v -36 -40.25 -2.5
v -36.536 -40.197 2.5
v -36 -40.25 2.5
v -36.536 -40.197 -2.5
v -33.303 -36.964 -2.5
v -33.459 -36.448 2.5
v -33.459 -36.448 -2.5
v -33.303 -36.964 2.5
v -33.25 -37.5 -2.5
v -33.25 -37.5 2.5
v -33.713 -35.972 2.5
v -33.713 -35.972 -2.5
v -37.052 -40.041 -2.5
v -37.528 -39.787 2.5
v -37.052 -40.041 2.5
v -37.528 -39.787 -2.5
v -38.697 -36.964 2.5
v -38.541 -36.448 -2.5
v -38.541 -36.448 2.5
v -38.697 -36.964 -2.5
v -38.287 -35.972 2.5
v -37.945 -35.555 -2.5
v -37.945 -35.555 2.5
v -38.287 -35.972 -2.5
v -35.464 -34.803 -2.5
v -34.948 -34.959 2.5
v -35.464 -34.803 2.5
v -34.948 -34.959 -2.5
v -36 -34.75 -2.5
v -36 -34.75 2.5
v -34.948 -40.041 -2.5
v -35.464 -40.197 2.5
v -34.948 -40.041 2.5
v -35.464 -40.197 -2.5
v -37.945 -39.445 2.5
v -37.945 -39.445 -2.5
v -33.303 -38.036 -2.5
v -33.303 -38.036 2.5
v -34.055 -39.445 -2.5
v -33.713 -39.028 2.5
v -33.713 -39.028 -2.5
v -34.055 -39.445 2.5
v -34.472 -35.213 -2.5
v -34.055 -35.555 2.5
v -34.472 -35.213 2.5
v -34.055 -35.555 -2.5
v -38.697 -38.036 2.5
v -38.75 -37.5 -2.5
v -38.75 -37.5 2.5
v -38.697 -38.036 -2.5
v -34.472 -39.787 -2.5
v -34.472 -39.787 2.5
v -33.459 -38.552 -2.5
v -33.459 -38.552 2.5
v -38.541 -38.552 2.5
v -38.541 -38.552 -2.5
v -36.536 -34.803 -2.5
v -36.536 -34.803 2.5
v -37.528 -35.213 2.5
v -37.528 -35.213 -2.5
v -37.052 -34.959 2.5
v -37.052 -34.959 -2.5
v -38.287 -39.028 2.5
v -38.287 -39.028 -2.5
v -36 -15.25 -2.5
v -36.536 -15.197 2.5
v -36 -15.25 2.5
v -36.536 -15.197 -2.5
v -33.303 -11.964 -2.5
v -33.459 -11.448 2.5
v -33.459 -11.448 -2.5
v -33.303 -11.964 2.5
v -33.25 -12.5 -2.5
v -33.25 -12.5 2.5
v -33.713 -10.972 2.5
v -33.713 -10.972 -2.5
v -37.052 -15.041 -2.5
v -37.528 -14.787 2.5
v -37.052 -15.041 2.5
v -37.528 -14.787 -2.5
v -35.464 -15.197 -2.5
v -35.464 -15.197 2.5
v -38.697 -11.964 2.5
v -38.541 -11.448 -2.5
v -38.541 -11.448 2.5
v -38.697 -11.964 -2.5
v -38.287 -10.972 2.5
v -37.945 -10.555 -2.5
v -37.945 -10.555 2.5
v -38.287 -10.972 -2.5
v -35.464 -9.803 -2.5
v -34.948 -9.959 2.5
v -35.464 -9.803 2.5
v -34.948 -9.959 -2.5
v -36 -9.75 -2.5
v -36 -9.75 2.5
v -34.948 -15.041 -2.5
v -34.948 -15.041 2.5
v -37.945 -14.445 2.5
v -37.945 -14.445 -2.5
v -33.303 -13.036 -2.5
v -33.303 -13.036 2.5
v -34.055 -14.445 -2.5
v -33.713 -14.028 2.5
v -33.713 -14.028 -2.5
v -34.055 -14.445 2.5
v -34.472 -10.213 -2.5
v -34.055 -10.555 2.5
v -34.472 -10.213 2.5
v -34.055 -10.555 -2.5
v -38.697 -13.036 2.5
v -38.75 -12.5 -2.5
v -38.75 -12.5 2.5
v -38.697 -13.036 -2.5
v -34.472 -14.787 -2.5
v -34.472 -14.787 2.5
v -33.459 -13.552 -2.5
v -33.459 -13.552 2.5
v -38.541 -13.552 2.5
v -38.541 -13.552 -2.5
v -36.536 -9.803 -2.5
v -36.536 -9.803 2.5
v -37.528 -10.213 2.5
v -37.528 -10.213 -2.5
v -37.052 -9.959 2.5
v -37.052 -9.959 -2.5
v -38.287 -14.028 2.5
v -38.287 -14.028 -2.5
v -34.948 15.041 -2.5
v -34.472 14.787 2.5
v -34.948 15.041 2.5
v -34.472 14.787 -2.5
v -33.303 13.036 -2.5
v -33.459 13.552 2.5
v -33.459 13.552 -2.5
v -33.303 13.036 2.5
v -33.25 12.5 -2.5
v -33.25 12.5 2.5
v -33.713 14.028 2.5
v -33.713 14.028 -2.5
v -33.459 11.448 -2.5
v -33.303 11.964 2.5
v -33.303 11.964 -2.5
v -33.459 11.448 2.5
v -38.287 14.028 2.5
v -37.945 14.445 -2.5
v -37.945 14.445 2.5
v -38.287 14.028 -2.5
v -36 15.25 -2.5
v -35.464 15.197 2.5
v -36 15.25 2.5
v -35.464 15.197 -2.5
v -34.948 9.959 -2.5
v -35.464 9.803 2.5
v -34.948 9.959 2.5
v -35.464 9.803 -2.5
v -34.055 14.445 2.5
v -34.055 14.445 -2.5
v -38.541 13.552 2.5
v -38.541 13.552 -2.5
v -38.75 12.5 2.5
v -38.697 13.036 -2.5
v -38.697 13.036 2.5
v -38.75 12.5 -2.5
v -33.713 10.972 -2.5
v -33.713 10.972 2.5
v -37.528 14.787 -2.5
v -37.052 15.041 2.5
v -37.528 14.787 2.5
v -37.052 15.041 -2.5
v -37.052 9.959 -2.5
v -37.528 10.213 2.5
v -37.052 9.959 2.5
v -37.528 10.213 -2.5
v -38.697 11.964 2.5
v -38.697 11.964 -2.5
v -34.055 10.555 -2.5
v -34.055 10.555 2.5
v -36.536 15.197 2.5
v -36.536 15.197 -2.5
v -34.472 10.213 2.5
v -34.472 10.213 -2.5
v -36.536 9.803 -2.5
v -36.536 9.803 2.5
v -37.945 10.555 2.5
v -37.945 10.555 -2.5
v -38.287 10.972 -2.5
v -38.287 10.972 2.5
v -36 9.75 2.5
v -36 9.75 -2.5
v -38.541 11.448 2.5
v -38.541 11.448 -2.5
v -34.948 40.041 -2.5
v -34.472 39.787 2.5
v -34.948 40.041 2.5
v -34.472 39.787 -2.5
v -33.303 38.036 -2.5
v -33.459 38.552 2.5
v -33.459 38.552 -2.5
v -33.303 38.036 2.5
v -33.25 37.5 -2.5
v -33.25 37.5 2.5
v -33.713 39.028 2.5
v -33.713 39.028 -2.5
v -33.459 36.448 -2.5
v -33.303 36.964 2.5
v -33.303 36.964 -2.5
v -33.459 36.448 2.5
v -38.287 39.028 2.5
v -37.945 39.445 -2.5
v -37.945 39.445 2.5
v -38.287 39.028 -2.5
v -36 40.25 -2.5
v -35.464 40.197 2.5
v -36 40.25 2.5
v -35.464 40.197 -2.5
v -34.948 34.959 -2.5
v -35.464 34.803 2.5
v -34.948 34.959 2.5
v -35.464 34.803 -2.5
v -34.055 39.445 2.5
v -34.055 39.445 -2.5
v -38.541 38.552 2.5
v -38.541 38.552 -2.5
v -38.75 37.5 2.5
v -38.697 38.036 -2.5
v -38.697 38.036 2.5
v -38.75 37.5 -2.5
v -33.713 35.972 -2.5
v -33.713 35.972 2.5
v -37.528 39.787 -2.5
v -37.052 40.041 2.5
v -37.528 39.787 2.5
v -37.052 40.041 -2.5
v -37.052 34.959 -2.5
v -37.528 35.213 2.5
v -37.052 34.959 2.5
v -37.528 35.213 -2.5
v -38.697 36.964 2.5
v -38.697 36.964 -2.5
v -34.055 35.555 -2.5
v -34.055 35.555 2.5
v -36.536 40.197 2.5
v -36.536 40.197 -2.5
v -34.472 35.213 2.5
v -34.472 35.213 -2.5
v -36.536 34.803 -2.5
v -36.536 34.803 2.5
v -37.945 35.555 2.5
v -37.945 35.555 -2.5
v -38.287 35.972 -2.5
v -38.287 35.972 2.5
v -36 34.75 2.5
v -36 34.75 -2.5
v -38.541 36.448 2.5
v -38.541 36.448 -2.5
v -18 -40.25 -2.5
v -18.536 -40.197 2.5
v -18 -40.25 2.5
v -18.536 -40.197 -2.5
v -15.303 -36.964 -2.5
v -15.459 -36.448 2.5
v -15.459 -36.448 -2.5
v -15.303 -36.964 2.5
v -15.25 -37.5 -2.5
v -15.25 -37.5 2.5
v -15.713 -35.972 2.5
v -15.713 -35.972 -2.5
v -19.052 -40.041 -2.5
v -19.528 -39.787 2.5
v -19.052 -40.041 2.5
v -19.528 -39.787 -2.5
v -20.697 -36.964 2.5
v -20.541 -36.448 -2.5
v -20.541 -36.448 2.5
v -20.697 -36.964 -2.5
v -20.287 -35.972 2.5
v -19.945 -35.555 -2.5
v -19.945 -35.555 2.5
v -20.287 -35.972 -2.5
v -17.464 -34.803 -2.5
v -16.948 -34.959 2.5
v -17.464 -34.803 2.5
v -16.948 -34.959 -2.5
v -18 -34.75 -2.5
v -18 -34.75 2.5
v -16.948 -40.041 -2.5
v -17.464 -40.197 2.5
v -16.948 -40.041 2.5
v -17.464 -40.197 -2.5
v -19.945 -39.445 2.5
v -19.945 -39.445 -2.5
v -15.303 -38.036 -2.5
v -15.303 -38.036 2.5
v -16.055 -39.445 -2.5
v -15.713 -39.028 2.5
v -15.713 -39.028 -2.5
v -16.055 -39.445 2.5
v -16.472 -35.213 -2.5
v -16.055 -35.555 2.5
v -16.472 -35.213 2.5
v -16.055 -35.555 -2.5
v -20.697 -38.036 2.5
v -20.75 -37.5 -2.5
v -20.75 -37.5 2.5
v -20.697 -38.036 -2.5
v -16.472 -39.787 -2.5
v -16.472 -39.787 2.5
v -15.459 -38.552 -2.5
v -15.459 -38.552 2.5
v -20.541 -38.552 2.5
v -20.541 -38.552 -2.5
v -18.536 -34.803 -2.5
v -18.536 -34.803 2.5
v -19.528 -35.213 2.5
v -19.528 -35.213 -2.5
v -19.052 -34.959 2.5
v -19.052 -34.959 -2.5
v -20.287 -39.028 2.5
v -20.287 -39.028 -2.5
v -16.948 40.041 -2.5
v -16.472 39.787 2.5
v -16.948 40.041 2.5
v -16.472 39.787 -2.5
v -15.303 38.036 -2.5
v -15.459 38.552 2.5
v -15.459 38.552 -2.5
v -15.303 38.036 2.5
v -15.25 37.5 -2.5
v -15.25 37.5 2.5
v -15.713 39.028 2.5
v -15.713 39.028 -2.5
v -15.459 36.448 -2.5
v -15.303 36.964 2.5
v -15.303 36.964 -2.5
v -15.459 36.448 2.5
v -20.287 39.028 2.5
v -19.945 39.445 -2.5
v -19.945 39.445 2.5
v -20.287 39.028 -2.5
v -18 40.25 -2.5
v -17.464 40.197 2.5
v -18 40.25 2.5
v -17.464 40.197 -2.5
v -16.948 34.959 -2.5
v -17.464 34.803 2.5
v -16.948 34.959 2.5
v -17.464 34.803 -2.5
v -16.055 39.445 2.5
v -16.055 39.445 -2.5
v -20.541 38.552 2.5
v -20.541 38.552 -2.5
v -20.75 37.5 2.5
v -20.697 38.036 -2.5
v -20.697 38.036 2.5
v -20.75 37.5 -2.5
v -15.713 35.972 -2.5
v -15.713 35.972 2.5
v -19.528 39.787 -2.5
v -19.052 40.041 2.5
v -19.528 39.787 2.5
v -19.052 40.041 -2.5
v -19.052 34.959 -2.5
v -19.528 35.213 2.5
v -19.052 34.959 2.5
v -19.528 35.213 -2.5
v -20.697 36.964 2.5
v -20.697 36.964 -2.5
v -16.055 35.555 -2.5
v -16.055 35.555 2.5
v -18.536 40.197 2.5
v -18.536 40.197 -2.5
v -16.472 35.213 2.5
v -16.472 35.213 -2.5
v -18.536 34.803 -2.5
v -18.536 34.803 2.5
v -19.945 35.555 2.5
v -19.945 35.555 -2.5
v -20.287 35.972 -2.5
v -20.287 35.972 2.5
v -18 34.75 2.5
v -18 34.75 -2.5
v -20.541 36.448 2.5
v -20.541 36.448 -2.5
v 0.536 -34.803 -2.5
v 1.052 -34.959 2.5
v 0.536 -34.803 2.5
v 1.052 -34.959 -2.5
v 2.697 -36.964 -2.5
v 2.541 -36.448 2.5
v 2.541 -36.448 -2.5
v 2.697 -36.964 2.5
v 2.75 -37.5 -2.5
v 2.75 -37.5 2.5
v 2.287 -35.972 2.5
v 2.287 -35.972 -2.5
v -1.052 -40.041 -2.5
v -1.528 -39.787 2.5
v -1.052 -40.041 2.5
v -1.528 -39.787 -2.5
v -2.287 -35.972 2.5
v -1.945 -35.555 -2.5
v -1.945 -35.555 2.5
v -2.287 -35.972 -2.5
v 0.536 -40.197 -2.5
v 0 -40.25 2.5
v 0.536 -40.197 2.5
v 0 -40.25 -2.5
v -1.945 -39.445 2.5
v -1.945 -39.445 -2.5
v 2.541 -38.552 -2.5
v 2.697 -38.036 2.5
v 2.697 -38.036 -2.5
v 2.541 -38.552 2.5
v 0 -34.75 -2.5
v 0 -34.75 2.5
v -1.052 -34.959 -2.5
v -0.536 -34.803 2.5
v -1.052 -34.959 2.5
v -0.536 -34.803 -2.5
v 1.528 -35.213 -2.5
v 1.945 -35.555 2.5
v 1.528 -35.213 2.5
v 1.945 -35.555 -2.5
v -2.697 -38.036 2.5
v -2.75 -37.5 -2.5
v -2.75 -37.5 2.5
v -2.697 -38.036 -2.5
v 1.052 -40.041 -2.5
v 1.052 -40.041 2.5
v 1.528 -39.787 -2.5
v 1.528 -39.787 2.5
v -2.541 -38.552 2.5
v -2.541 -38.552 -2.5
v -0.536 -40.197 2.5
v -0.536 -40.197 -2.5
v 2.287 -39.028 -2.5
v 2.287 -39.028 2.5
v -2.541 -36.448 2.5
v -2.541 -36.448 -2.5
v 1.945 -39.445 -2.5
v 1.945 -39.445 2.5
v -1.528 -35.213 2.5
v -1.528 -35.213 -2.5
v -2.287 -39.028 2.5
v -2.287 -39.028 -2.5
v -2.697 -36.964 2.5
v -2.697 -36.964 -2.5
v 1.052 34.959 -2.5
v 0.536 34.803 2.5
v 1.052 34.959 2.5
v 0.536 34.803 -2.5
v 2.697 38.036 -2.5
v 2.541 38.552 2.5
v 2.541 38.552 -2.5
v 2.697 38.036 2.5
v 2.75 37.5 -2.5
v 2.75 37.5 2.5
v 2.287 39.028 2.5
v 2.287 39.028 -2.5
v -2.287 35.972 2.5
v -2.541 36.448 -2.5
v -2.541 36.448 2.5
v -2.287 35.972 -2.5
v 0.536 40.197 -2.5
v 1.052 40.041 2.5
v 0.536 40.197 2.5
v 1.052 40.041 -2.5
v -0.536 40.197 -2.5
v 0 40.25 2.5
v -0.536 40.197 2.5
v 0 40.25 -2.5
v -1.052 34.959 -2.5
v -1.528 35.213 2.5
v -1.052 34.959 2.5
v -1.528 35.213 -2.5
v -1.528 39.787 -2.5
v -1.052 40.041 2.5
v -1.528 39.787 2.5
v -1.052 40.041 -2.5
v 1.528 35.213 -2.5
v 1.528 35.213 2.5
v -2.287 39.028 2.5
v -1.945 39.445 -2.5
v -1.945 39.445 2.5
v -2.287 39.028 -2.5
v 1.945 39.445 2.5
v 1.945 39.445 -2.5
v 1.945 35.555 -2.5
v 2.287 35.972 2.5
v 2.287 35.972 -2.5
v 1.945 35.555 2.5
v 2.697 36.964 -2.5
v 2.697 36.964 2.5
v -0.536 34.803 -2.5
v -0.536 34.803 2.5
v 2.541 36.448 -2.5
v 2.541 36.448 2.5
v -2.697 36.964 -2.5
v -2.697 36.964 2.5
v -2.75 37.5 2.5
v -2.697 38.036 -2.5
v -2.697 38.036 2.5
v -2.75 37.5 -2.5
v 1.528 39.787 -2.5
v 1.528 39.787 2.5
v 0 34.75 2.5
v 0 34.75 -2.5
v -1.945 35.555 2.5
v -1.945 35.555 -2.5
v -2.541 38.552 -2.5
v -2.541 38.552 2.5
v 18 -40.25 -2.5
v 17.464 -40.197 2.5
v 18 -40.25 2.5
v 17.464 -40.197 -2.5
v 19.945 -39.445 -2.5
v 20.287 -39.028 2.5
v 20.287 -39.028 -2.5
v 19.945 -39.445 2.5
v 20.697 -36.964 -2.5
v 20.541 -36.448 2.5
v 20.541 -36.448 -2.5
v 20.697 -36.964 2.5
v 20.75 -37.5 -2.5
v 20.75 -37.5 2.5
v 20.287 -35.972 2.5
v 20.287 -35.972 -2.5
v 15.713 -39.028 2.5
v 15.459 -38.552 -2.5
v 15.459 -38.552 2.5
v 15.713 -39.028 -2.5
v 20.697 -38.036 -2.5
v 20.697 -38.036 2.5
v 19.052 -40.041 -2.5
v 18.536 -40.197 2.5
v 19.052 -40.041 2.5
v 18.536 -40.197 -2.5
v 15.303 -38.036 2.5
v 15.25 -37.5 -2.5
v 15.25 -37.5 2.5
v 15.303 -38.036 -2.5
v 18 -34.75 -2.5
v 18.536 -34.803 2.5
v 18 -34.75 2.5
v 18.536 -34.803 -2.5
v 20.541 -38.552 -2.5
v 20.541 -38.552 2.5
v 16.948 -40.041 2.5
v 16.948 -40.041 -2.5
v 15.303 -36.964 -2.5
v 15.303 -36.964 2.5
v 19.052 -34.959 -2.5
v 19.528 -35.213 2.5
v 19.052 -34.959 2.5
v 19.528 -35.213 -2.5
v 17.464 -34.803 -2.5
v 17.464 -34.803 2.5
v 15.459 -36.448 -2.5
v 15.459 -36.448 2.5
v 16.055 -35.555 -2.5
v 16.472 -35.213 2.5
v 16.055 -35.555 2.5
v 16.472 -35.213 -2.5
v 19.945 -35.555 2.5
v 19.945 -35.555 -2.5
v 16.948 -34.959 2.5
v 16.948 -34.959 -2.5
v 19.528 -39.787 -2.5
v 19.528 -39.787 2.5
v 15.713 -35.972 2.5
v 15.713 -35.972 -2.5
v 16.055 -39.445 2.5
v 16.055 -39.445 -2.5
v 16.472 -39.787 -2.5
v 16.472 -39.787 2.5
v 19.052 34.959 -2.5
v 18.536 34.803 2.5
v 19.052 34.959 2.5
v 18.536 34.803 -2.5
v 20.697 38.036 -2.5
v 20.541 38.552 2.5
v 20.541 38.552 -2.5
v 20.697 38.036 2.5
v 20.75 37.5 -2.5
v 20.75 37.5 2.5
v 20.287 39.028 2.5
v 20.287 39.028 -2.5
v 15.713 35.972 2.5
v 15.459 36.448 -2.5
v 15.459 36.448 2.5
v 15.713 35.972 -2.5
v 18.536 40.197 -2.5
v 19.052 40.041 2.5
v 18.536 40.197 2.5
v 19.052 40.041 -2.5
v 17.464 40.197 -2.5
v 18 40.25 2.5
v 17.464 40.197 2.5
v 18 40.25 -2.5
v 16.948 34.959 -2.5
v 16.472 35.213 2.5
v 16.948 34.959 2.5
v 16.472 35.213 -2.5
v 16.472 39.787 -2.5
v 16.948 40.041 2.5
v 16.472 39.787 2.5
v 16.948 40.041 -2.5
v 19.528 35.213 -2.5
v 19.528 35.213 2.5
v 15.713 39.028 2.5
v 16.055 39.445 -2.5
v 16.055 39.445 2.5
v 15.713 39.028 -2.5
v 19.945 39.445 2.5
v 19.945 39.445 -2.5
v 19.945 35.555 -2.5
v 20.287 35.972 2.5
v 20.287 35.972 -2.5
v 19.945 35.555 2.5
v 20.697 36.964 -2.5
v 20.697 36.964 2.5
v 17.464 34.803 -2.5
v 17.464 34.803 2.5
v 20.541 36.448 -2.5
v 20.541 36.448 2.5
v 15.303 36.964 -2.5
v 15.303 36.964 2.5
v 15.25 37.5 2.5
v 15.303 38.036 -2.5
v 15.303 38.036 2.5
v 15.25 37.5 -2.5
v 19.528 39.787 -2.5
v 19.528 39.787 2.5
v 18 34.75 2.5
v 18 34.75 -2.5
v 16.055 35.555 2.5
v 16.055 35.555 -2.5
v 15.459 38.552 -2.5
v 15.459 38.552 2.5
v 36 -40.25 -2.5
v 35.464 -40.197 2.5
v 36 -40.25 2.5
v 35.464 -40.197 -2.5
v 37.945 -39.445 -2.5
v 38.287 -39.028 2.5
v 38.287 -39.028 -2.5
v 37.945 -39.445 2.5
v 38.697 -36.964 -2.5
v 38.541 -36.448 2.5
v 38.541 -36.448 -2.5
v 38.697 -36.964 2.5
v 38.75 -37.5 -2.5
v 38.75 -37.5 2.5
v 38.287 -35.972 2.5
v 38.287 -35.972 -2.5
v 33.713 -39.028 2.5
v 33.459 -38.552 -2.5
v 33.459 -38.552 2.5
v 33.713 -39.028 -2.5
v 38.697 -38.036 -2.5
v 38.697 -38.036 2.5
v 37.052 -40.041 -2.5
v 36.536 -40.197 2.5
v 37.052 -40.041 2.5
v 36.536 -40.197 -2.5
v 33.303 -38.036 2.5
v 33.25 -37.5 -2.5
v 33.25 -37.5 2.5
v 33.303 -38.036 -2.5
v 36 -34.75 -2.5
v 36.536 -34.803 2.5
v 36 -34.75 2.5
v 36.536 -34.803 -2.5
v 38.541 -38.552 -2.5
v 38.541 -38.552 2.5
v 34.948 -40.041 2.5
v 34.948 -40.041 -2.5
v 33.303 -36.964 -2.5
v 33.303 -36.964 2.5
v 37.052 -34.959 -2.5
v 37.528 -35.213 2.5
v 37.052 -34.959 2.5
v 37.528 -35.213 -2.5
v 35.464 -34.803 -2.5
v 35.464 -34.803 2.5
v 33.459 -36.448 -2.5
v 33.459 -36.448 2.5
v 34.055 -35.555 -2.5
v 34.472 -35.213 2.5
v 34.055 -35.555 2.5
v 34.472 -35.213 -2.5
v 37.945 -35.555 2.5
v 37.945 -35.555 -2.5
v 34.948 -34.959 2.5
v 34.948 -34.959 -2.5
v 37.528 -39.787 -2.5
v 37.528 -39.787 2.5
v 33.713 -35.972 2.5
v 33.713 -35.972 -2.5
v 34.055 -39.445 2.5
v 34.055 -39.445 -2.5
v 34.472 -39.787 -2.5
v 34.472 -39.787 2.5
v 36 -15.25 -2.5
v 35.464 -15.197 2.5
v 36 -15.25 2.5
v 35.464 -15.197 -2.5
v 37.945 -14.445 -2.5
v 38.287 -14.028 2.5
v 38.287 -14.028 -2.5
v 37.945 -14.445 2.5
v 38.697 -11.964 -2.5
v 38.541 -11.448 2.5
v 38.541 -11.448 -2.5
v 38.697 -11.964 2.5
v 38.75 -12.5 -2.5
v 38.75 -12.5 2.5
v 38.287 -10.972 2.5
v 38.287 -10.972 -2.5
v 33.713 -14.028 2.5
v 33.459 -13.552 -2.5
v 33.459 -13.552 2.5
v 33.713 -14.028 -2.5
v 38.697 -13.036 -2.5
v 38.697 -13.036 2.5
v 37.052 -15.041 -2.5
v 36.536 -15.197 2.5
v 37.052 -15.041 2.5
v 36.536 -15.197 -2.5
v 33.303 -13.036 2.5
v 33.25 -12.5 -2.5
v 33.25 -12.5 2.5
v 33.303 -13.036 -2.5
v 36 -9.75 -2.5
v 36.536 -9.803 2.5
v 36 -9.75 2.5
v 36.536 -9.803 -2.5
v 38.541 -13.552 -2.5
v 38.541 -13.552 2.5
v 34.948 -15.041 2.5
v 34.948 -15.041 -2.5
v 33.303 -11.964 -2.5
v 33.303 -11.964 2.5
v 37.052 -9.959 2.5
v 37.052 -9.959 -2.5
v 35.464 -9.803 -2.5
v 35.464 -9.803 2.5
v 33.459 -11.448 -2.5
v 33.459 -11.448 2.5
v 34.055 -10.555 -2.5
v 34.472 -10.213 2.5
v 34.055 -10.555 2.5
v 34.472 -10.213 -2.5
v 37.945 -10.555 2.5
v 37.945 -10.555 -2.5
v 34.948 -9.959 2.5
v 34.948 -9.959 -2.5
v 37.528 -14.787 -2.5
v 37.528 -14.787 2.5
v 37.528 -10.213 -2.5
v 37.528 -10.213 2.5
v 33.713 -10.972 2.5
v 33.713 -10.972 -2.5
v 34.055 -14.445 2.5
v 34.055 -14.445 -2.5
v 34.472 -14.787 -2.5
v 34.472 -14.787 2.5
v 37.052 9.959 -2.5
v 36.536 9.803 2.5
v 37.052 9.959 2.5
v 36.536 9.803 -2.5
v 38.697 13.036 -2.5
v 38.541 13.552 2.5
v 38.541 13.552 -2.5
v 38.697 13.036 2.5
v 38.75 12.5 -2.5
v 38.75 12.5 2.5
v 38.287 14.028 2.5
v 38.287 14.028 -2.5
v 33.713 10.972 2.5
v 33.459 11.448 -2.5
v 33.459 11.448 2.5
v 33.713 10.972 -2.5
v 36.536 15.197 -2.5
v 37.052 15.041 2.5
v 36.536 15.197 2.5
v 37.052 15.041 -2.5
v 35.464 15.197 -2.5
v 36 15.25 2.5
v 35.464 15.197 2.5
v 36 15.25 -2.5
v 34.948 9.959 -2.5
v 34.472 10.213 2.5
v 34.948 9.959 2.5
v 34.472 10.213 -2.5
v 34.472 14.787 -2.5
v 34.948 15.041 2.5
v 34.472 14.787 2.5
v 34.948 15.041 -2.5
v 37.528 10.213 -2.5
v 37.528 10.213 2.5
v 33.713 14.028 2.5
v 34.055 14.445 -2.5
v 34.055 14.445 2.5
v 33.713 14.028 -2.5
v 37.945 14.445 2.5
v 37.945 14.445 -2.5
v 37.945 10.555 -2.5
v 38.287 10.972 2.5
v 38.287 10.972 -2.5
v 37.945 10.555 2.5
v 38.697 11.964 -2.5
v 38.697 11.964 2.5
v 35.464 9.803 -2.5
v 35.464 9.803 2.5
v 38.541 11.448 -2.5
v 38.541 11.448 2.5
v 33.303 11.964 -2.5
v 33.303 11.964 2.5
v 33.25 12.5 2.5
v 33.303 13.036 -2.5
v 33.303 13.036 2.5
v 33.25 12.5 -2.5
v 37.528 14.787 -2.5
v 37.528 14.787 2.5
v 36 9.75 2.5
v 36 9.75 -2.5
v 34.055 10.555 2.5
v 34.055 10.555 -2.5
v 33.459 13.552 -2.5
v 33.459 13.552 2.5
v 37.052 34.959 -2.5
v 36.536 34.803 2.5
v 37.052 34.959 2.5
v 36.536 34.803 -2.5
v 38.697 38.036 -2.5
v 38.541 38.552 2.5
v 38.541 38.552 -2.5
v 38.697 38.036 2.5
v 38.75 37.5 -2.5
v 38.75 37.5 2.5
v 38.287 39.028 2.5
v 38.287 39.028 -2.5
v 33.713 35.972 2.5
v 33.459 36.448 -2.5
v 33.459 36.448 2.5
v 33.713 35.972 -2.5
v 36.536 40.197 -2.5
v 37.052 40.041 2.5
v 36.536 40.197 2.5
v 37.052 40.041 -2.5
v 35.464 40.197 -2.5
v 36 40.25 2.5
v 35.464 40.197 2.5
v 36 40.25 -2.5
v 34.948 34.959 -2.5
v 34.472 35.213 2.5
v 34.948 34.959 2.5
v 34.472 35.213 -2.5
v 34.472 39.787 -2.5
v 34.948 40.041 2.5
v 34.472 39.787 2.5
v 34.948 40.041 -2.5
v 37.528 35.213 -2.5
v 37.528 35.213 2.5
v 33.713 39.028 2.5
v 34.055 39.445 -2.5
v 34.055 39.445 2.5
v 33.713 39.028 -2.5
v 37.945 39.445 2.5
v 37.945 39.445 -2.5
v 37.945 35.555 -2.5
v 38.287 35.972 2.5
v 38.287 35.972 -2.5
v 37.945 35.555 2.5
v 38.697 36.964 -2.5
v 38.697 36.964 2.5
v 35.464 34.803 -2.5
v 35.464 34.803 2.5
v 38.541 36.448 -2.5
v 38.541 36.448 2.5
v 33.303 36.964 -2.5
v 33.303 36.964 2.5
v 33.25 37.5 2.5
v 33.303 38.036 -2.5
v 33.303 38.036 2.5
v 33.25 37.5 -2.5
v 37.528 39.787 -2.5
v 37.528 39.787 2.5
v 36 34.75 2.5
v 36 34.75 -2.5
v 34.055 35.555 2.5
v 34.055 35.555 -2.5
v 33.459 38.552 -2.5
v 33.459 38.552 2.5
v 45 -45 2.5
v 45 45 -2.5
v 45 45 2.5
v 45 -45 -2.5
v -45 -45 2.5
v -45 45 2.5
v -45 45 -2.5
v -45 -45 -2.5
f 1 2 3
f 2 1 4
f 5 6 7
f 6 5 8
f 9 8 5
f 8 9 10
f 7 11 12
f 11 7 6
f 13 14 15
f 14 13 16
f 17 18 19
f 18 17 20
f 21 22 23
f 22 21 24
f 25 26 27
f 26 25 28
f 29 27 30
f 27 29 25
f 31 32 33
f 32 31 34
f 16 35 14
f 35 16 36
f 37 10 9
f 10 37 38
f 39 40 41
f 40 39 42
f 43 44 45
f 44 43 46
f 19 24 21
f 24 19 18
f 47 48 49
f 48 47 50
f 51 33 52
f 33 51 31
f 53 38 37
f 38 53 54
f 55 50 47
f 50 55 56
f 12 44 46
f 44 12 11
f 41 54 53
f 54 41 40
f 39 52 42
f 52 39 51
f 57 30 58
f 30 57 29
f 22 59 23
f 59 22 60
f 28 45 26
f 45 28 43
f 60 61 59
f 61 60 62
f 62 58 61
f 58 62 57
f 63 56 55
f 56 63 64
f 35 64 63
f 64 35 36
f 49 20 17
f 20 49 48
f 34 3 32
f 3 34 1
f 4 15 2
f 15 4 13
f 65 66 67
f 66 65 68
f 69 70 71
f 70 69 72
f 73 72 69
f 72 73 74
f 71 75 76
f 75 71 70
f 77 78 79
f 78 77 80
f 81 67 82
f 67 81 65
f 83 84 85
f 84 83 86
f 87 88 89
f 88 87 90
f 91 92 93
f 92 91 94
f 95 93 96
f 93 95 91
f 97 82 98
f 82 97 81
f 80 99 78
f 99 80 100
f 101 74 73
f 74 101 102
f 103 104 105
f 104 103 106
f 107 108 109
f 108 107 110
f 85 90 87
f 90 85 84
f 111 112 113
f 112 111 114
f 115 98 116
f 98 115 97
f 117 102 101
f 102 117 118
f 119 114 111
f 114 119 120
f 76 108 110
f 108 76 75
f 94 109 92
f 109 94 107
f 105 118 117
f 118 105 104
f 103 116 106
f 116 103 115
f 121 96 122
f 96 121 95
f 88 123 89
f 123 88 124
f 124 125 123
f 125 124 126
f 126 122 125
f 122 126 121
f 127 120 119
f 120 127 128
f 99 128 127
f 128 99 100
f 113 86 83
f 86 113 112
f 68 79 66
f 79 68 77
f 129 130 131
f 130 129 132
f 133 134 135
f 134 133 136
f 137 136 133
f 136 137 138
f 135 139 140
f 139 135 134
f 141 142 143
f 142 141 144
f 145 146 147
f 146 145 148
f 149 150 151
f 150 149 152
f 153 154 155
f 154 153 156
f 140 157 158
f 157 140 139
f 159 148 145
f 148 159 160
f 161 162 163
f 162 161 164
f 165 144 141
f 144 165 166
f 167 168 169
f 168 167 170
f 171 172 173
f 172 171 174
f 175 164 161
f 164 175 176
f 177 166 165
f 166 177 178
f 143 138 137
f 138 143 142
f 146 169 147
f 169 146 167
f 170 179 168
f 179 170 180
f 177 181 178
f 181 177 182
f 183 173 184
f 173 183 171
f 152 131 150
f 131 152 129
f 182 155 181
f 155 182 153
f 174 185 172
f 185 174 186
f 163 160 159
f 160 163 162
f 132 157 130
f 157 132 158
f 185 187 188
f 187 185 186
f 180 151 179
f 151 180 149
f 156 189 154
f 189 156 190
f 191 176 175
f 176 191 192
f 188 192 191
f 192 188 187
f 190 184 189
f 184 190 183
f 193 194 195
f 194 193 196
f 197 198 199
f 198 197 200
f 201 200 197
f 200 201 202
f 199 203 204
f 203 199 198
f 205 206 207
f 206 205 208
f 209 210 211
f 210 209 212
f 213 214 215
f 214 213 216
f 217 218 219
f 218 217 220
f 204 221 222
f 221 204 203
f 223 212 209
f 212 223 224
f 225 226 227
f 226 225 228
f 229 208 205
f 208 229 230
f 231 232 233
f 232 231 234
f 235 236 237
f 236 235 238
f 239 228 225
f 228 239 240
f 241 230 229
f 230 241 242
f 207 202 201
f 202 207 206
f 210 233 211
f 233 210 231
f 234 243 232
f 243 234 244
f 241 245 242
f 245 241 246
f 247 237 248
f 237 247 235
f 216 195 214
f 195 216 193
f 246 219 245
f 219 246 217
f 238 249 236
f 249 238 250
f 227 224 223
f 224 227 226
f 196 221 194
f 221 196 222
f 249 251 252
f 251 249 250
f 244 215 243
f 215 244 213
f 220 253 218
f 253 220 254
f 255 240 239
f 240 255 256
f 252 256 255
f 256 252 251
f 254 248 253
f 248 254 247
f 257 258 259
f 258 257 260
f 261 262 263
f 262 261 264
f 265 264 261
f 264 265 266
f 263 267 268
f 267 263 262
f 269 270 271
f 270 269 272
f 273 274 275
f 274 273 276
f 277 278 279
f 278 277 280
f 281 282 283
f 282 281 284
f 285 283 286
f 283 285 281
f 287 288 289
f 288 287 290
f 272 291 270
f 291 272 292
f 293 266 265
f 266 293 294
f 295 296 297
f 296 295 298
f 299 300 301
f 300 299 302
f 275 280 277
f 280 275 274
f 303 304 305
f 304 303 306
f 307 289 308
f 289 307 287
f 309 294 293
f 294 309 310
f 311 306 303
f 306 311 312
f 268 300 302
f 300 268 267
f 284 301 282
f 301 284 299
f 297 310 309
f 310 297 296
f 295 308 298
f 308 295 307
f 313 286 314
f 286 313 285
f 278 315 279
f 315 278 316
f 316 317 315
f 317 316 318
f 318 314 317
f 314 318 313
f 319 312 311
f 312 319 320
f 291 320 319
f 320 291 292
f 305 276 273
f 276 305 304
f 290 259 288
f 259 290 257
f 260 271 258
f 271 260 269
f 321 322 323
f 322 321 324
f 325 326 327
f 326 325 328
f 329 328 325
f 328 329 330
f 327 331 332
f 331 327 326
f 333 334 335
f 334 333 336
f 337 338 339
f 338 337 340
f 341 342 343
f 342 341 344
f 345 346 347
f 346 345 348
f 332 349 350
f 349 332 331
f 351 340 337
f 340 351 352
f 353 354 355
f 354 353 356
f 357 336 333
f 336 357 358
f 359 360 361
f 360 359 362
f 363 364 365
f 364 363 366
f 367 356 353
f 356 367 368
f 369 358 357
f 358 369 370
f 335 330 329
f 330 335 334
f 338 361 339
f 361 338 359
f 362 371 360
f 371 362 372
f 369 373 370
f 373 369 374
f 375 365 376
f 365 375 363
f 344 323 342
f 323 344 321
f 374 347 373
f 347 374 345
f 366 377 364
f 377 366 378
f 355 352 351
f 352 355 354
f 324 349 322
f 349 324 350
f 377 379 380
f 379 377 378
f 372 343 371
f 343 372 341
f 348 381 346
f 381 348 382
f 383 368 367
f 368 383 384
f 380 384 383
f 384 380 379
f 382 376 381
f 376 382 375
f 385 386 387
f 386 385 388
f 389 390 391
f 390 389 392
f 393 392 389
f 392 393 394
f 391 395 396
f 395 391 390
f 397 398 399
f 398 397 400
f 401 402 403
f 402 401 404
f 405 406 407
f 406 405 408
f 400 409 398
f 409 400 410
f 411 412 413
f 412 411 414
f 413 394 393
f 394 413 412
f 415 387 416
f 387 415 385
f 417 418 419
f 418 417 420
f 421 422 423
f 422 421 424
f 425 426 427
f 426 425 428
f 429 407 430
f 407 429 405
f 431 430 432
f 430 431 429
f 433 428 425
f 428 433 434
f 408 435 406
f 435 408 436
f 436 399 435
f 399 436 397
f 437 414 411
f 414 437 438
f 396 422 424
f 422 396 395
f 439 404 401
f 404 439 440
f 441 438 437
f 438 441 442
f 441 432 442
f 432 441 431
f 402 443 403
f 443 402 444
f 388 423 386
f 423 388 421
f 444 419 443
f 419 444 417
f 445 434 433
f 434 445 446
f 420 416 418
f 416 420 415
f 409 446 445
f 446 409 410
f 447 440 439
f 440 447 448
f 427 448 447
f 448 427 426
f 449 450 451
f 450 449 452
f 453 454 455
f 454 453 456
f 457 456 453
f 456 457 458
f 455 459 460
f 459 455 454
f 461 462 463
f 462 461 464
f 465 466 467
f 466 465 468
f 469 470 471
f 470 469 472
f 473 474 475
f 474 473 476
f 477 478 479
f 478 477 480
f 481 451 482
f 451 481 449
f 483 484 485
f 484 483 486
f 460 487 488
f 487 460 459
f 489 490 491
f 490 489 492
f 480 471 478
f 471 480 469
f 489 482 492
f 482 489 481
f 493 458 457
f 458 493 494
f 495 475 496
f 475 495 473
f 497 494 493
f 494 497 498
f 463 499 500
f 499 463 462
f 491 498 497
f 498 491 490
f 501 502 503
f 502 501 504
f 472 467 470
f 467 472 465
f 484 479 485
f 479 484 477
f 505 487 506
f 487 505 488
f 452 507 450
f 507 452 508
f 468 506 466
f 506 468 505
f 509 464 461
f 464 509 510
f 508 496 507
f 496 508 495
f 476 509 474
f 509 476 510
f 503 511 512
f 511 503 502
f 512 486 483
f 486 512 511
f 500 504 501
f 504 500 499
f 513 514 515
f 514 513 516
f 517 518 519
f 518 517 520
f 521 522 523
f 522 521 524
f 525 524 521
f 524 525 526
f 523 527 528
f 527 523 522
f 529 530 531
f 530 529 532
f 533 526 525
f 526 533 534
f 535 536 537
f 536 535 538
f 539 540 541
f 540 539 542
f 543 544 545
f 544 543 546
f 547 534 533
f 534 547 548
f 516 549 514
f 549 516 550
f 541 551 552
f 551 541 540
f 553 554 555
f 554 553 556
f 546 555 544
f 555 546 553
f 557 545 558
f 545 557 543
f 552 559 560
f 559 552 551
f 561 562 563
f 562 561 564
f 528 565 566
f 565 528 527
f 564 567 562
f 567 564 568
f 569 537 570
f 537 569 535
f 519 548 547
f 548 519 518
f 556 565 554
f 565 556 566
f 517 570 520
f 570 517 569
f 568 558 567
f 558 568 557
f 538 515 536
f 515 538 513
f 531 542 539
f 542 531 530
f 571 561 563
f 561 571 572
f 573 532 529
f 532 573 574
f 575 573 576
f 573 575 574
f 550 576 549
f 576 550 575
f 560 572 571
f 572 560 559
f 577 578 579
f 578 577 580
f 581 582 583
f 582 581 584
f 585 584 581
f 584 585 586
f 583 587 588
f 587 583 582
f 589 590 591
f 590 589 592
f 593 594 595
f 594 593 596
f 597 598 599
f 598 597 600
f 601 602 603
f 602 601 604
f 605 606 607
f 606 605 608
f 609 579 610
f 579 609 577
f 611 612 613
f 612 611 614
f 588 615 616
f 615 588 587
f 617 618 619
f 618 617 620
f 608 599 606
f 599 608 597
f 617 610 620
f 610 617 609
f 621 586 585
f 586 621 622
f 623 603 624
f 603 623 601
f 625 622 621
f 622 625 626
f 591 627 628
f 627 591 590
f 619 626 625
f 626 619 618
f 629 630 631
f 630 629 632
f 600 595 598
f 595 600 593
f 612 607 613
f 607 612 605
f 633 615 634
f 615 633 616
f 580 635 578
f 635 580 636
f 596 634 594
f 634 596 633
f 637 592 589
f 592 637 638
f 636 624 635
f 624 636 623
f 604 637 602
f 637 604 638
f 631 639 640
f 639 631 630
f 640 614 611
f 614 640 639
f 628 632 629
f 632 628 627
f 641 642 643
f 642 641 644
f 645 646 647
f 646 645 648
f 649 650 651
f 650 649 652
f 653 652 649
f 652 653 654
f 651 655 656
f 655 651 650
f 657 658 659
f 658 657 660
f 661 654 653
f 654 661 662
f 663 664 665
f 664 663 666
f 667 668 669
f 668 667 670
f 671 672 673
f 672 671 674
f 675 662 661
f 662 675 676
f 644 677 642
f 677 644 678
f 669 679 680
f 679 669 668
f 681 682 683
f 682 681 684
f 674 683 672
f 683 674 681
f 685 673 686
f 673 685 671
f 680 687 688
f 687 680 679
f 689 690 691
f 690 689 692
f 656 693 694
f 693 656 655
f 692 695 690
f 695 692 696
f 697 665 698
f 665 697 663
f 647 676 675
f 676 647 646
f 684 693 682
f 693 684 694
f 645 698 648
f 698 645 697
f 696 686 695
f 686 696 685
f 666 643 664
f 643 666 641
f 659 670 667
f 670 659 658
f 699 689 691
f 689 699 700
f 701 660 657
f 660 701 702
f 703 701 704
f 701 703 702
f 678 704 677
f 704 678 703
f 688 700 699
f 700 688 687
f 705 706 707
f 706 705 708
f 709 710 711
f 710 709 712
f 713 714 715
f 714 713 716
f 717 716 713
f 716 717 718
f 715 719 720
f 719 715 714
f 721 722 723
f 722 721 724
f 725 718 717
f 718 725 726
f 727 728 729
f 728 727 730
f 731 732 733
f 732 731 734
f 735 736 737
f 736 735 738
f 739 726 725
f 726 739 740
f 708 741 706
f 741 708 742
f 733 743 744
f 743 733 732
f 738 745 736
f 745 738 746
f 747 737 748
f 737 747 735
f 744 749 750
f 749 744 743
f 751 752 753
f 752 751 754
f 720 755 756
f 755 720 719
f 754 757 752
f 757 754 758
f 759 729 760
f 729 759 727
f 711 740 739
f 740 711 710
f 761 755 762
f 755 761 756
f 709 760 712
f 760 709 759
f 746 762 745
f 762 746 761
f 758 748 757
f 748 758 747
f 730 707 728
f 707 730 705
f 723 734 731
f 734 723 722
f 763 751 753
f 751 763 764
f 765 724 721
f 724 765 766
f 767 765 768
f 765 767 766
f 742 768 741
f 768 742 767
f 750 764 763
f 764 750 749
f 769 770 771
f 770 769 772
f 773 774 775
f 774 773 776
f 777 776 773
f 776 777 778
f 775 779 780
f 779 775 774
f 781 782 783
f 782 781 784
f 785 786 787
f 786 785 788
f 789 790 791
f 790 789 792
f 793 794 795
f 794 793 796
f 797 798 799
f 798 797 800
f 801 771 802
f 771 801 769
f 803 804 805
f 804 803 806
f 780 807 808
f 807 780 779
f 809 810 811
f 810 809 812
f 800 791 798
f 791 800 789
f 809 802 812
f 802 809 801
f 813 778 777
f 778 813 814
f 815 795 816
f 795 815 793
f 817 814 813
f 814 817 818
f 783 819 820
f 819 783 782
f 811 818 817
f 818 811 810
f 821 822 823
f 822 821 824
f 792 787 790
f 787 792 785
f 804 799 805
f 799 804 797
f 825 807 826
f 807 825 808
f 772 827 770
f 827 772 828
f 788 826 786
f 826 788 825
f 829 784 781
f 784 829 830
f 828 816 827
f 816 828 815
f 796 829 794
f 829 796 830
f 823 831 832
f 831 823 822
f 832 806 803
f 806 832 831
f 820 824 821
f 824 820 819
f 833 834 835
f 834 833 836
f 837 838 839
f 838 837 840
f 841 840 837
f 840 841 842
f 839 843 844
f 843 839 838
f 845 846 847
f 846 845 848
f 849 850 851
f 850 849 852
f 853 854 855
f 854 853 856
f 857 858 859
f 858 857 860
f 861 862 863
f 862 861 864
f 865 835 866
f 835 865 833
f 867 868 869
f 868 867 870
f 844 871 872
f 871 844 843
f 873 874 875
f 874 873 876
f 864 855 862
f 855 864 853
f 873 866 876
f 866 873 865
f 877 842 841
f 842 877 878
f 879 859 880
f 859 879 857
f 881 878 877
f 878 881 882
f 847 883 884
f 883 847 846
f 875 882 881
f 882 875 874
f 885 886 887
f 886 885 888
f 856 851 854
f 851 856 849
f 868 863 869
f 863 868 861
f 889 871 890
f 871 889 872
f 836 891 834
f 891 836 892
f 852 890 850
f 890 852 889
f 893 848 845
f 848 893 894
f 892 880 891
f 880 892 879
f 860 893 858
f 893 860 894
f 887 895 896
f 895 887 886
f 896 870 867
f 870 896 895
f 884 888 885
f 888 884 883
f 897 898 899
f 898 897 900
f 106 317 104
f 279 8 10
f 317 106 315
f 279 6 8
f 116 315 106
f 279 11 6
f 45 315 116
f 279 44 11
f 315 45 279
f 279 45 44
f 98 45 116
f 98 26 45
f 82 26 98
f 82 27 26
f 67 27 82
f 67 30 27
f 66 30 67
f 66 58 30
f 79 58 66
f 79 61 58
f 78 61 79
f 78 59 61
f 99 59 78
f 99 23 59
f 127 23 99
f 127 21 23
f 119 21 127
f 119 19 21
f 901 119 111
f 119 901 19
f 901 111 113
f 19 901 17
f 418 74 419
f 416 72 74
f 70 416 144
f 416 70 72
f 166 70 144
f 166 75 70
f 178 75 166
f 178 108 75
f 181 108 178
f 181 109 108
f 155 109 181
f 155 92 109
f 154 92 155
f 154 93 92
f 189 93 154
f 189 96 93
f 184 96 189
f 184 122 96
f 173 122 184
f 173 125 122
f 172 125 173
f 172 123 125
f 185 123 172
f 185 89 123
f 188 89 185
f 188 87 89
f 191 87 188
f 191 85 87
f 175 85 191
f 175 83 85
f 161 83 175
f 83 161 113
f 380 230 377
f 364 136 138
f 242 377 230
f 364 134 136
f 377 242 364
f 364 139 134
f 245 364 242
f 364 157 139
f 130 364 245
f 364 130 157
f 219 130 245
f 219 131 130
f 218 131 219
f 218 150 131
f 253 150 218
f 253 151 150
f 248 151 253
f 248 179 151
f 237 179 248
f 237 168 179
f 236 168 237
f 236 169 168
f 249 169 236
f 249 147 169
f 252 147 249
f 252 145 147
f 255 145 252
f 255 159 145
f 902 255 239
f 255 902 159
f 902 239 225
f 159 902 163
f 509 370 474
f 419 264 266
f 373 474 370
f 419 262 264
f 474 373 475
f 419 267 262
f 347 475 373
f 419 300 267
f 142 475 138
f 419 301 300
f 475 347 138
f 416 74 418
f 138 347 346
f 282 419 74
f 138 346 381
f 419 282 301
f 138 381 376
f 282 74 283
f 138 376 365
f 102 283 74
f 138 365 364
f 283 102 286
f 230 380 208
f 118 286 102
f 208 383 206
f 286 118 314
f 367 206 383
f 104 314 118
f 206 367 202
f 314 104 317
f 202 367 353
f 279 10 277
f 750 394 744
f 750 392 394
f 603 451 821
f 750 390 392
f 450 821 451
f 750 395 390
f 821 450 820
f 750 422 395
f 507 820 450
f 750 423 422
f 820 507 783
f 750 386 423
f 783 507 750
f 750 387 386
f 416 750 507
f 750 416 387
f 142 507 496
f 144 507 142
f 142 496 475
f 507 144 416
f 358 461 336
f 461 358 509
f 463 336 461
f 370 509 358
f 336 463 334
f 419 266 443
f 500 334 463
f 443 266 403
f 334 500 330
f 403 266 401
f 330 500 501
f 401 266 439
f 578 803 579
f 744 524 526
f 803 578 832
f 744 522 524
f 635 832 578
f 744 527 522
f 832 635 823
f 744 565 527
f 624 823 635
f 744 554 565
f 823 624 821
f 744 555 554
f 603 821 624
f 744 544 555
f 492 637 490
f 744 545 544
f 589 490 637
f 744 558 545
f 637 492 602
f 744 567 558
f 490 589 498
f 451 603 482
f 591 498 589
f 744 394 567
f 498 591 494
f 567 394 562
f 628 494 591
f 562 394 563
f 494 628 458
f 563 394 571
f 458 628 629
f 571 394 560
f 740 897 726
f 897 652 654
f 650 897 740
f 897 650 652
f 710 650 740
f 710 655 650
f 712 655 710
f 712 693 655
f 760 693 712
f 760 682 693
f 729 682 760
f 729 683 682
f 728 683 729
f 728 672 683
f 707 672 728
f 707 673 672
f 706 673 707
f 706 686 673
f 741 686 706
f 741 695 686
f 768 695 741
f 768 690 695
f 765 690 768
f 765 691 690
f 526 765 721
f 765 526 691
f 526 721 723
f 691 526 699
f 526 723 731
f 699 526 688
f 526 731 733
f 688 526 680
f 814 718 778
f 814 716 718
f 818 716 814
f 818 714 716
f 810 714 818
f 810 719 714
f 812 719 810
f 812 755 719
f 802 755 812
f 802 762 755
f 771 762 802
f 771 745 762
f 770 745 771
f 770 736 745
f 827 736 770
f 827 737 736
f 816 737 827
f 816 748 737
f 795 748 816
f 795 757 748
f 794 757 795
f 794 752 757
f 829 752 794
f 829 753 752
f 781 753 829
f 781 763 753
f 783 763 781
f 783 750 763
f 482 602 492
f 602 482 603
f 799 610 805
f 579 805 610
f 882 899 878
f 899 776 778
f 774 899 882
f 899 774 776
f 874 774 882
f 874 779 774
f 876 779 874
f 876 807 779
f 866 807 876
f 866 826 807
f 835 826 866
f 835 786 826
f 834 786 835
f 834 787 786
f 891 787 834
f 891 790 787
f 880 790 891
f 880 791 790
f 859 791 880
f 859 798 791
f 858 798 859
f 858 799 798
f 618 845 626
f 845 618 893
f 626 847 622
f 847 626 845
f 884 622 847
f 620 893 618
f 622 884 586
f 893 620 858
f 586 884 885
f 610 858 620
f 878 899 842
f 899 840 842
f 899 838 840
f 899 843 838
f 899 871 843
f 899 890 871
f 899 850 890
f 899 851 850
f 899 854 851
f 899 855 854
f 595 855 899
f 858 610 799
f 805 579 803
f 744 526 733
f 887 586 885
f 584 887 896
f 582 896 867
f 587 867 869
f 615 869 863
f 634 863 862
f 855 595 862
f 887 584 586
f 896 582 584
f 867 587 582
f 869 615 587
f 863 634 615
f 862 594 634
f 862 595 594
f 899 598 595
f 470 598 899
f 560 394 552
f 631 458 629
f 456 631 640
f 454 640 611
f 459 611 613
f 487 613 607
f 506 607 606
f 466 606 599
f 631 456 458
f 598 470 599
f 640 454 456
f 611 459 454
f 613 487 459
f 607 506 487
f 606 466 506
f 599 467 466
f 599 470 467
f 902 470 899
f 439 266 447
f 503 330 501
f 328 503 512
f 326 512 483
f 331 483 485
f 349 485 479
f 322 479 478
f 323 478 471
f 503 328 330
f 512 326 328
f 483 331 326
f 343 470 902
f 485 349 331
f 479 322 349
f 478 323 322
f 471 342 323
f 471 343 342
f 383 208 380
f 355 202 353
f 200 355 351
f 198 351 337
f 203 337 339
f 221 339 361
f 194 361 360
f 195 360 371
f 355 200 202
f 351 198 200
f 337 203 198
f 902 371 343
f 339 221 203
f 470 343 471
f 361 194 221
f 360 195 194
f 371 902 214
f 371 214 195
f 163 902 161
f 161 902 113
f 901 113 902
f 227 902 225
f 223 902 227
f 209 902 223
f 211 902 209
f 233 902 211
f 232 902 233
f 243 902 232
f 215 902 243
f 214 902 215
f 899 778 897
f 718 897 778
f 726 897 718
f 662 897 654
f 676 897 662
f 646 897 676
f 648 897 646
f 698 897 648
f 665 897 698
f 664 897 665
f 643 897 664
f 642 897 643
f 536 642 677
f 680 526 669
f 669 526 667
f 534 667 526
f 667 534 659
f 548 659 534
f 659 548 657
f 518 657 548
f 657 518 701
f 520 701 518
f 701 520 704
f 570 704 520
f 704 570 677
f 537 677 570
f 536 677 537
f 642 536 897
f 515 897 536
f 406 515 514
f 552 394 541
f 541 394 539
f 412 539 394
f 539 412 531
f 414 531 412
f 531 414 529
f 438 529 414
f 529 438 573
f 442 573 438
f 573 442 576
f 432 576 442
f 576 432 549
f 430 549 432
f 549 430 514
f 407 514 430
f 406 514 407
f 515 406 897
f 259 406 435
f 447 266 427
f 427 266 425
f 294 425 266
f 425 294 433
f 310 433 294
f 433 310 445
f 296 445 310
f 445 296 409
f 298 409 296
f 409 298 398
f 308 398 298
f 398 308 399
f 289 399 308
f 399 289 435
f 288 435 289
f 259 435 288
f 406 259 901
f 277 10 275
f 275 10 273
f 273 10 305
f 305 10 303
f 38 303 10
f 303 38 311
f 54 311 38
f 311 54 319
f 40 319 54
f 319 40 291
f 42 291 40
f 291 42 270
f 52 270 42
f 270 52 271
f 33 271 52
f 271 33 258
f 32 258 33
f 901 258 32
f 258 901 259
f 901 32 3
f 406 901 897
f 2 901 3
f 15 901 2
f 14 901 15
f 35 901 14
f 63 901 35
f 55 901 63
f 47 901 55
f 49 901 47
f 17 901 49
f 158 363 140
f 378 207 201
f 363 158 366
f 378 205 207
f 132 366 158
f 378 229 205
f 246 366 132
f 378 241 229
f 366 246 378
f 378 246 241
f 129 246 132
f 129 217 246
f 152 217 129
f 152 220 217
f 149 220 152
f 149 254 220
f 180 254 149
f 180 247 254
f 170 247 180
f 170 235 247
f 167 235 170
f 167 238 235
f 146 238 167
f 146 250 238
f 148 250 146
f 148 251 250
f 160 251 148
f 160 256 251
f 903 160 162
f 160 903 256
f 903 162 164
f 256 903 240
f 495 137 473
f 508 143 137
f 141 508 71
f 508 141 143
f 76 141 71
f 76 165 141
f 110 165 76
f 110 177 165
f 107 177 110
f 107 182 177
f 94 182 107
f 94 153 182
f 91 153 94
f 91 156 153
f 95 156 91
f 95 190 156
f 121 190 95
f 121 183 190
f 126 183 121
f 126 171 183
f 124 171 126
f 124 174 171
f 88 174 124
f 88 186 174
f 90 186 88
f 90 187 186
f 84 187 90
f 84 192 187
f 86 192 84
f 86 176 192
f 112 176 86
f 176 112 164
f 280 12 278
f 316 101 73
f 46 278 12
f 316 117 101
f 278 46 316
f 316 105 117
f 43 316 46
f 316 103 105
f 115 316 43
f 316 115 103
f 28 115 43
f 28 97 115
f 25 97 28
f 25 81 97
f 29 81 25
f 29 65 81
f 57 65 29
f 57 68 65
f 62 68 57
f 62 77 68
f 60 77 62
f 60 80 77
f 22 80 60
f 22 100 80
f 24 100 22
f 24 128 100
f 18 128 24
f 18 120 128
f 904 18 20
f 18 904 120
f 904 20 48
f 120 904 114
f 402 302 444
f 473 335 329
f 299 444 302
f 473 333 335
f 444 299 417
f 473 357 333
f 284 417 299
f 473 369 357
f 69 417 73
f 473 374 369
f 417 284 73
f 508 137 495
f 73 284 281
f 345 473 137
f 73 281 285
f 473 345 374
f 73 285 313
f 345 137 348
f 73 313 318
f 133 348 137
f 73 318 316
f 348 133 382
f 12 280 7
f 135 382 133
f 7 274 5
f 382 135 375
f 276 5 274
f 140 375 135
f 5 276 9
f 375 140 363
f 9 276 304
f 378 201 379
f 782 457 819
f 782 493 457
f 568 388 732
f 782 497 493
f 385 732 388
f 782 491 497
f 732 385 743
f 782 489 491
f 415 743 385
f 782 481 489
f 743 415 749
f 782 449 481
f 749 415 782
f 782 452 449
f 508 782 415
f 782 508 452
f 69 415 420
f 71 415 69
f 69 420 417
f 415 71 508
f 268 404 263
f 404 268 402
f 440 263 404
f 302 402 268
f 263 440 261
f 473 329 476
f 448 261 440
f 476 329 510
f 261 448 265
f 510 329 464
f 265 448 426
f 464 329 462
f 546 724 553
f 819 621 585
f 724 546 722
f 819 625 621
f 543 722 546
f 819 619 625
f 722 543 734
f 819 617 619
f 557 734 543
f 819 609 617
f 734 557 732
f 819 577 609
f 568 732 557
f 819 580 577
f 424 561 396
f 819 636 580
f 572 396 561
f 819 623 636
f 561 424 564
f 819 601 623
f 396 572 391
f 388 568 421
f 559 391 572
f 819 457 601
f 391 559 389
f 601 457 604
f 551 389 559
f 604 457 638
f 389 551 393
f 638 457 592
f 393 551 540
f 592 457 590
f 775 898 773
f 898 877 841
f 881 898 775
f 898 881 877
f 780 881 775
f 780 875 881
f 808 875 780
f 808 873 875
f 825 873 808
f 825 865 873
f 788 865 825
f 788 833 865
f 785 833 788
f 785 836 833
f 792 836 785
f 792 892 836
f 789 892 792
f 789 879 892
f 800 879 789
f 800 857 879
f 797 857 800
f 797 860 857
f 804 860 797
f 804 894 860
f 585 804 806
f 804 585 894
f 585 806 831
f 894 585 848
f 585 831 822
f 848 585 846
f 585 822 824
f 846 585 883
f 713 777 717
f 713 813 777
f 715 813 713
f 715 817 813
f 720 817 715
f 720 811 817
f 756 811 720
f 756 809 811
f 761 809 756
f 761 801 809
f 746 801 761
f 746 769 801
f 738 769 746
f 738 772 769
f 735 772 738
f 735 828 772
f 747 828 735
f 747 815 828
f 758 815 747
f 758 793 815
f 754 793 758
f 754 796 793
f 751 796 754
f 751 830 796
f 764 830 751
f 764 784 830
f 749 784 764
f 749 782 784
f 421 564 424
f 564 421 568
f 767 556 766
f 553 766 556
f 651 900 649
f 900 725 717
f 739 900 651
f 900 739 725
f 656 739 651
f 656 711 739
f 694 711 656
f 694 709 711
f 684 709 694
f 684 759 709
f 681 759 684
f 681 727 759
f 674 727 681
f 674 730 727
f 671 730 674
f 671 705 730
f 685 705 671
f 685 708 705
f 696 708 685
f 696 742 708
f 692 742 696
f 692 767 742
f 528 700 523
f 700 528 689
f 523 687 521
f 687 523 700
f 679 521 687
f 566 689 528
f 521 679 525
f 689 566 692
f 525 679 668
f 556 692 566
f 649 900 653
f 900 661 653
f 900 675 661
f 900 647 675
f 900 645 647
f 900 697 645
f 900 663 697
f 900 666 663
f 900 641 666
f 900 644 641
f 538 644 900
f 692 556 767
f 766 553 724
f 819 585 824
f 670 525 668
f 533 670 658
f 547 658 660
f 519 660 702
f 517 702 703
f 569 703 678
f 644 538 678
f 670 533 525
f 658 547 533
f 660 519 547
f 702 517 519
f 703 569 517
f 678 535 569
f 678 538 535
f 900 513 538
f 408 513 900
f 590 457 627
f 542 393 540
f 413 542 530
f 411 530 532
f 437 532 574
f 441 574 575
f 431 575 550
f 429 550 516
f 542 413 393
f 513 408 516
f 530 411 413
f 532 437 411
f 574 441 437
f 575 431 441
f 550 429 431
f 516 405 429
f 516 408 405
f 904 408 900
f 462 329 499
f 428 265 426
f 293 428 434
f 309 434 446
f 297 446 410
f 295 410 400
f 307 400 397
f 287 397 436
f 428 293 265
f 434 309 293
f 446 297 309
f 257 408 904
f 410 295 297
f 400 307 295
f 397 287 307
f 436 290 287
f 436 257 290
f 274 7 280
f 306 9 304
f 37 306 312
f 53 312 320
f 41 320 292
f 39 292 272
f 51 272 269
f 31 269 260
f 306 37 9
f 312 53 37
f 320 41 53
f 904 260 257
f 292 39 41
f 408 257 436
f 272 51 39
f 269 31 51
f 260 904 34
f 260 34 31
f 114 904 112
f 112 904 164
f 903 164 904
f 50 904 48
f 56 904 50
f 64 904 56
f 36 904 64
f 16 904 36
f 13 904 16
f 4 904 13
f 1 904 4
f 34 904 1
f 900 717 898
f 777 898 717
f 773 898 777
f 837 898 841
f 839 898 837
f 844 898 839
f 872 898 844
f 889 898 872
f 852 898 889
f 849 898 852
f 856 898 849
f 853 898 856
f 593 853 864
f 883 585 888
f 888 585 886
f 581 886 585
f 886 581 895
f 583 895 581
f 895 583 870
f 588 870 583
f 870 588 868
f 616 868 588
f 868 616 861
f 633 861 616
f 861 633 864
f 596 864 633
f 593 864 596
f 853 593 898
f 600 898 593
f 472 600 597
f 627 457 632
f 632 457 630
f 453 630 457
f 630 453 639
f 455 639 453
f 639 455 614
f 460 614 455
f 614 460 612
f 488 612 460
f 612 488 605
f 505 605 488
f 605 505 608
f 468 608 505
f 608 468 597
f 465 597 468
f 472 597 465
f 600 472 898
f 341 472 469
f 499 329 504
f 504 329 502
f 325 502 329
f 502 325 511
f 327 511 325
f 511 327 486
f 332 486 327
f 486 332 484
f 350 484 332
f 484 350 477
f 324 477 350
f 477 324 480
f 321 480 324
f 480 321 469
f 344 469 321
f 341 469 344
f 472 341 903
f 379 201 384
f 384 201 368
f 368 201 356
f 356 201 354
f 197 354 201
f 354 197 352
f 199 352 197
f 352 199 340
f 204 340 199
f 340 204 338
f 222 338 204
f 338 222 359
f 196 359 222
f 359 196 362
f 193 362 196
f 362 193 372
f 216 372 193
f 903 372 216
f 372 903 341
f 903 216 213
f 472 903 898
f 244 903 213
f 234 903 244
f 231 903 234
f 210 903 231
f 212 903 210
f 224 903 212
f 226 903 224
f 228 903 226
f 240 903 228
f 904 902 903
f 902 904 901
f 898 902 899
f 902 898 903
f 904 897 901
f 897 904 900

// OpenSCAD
$fn = 32;

// ----------------------------------------------------------------------
// Perforated panel 90 x 90 x 5
// 4 x 5 Ø5.5 holes, frame layout
// ----------------------------------------------------------------------

// --- parameters (mm) ---
panel = [90, 90, 5];  // overall size (x, y, z)
hole_d = 5.5;         // hole diameter
pitch_x = 18;         // hole pitch along X
pitch_y = 25;         // hole pitch along Y

// --- derived feature positions (mm) ---
margin = hole_d / 2 + 2;            // = 4.75   clearance from the panel edge
cols = floor((panel[0] - 2 * margin) / pitch_x) + 1;  // = 5   how many columns fit in X
rows = floor((panel[1] - 2 * margin) / pitch_y) + 1;  // = 4   how many rows fit in Y
span_x = (cols - 1) * pitch_x + 0;  // = 72   width of the field
span_y = (rows - 1) * pitch_y;      // = 75   height of the field
origin_x = -span_x / 2;             // = -36   X of the first hole
origin_y = -span_y / 2;             // = -37.5   Y of the first row
holes = 2 * cols + 2 * (rows - 2);  // = 14   holes around the frame
feature_centers = [
  [origin_x + 0 * pitch_x, origin_y + 0 * pitch_y],
  [origin_x + 0 * pitch_x, origin_y + 1 * pitch_y],
  [origin_x + 0 * pitch_x, origin_y + 2 * pitch_y],
  [origin_x + 0 * pitch_x, origin_y + 3 * pitch_y],
  [origin_x + 1 * pitch_x, origin_y + 0 * pitch_y],
  [origin_x + 1 * pitch_x, origin_y + 3 * pitch_y],
  [origin_x + 2 * pitch_x, origin_y + 0 * pitch_y],
  [origin_x + 2 * pitch_x, origin_y + 3 * pitch_y],
  [origin_x + 3 * pitch_x, origin_y + 0 * pitch_y],
  [origin_x + 3 * pitch_x, origin_y + 3 * pitch_y],
  [origin_x + 4 * pitch_x, origin_y + 0 * pitch_y],
  [origin_x + 4 * pitch_x, origin_y + 1 * pitch_y],
  [origin_x + 4 * pitch_x, origin_y + 2 * pitch_y],
  [origin_x + 4 * pitch_x, origin_y + 3 * pitch_y]
];   // hole centres, used verbatim by the cutter loop

// panel outline, every hole through
difference() {
  cube(panel, center = true);
  for (centre = feature_centers)
    translate([centre[0], centre[1], 0])
      cylinder(d = hole_d, h = panel[2] + 2, center = true);
}
